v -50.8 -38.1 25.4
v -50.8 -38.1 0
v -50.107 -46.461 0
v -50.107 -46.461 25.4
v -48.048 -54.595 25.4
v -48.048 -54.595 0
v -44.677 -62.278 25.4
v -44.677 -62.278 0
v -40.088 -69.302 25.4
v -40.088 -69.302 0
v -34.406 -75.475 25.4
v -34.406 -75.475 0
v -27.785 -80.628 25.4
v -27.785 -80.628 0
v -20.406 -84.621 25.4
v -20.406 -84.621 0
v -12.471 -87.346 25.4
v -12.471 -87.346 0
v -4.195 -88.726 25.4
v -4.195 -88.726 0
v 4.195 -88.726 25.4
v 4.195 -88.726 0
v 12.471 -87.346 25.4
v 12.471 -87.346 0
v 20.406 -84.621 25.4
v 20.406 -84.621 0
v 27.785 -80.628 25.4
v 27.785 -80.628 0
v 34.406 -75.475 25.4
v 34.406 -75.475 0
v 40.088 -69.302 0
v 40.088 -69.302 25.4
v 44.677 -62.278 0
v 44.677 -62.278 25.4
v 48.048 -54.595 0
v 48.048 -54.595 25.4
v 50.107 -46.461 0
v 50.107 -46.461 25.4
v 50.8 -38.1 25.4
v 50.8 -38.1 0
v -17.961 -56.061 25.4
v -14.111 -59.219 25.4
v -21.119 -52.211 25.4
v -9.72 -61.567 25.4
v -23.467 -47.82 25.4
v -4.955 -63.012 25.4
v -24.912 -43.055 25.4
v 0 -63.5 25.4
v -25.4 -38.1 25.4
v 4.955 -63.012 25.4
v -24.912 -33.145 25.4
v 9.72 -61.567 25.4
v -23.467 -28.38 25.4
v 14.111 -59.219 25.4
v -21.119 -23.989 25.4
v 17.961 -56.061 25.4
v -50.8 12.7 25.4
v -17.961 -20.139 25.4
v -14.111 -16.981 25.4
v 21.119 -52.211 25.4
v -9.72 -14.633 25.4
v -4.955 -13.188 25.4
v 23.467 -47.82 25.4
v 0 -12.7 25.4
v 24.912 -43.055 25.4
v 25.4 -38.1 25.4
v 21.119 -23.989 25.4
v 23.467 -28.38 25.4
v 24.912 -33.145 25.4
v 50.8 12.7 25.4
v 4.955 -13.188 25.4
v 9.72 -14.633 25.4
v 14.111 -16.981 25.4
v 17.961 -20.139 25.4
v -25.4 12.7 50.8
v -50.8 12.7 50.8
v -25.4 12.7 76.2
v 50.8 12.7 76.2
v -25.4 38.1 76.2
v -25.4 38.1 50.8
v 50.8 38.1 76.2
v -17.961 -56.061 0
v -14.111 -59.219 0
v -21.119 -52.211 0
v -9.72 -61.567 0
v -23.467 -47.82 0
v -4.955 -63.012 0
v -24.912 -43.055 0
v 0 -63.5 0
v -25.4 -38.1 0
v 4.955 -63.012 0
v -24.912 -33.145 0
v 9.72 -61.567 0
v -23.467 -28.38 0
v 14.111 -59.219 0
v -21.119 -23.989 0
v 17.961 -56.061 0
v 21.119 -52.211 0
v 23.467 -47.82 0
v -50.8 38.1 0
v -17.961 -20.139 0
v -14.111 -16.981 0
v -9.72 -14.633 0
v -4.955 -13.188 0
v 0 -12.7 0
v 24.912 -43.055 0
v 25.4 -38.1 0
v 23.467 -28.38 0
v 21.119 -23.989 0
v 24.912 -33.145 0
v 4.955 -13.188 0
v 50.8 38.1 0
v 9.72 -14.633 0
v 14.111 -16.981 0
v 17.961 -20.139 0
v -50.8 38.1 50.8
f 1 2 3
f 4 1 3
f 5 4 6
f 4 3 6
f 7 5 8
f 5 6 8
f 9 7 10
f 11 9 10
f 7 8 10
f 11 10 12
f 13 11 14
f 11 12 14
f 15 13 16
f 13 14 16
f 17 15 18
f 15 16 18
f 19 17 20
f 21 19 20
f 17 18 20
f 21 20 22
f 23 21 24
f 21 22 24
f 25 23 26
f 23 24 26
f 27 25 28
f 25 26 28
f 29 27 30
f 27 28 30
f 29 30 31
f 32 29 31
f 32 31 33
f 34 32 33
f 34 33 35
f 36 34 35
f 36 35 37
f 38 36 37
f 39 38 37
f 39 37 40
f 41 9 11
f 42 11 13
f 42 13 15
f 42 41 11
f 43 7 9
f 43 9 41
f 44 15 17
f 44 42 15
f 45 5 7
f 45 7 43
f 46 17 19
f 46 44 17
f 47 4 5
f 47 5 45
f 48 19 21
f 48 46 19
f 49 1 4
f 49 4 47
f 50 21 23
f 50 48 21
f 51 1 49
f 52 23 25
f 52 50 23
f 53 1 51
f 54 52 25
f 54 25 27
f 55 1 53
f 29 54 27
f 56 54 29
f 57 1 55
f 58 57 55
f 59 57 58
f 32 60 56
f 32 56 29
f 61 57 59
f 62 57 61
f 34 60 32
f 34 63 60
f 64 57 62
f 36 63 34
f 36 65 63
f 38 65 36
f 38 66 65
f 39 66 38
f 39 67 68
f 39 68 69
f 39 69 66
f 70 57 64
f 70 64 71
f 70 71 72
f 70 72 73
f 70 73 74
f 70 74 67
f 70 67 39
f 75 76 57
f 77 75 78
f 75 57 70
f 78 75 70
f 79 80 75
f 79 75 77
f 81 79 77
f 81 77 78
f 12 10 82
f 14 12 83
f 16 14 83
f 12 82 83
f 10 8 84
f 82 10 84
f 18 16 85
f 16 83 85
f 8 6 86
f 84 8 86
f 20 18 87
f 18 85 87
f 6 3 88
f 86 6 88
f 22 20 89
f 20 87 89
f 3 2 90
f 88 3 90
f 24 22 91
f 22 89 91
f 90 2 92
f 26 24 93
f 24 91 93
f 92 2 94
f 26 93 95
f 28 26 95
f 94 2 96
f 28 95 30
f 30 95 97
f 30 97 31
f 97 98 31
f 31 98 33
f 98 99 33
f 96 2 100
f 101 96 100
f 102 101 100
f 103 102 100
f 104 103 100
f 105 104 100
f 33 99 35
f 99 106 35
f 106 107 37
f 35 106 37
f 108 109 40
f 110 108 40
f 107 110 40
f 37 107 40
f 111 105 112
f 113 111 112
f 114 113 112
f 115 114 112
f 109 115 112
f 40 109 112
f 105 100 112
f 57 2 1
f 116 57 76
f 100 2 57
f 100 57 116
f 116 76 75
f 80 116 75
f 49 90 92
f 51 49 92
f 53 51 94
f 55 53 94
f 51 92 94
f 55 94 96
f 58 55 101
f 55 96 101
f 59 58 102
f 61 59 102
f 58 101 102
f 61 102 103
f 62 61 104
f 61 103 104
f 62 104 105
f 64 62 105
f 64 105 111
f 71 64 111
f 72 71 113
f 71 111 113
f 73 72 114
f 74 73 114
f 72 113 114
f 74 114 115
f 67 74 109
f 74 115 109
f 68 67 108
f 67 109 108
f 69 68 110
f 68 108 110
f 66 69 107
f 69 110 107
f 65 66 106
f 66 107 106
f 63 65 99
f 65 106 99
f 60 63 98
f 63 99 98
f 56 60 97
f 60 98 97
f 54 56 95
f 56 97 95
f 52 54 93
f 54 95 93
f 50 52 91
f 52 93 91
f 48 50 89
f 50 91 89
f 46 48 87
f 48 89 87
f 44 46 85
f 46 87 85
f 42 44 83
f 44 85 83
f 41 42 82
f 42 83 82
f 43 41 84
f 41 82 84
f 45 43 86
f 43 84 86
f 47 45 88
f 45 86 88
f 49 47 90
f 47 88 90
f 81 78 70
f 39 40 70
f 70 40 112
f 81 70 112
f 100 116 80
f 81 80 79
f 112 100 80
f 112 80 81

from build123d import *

# Parameters (mm, degrees)
F1_DEPTH = 25.4
F2_W     = 101.6
F2_H     = 25.4
F3_DEPTH = 50.8
F4_W     = 25.4
F4_H     = 25.4
F5_DEPTH = 25.401


with BuildPart() as f1:
    # F0 (on Top) → F1 (new body)
    with BuildSketch(Plane.XY):
        with BuildLine():
            ThreePointArc((-50.8, -38.1), (0, -88.9), (50.8, -38.1))
            Line((50.8, -38.1), (25.4, -38.1))
            ThreePointArc((25.4, -38.1), (0, -63.5), (-25.4, -38.1))
            Line((-25.4, -38.1), (-50.8, -38.1))
        make_face()
        with BuildLine():
            ThreePointArc((-50.8, -38.1), (0, 12.7), (50.8, -38.1))
            Line((50.8, -38.1), (50.8, 38.1))
            Line((50.8, 38.1), (-50.8, 38.1))
            Line((-50.8, 38.1), (-50.8, -38.1))
        make_face()
        with BuildLine():
            Line((25.4, -38.1), (50.8, -38.1))
            ThreePointArc((50.8, -38.1), (0, 12.7), (-50.8, -38.1))
            Line((-50.8, -38.1), (-25.4, -38.1))
            ThreePointArc((-25.4, -38.1), (0, -12.7), (25.4, -38.1))
        make_face()
    extrude(amount=F1_DEPTH)

    # F2 (on face) → F3 (join)
    with BuildSketch(Plane.XY.offset(25.4)):
        with Locations((0, 25.4)):
            Rectangle(F2_W, F2_H)
    extrude(amount=F3_DEPTH)

    # F4 (on face) → F5 (cut, through all)
    with BuildSketch(Plane.XZ.offset(-12.7)):
        with Locations((-38.1, 63.5)):
            Rectangle(F4_W, F4_H)
    extrude(amount=-F5_DEPTH, mode=Mode.SUBTRACT)


solid = f1.part
